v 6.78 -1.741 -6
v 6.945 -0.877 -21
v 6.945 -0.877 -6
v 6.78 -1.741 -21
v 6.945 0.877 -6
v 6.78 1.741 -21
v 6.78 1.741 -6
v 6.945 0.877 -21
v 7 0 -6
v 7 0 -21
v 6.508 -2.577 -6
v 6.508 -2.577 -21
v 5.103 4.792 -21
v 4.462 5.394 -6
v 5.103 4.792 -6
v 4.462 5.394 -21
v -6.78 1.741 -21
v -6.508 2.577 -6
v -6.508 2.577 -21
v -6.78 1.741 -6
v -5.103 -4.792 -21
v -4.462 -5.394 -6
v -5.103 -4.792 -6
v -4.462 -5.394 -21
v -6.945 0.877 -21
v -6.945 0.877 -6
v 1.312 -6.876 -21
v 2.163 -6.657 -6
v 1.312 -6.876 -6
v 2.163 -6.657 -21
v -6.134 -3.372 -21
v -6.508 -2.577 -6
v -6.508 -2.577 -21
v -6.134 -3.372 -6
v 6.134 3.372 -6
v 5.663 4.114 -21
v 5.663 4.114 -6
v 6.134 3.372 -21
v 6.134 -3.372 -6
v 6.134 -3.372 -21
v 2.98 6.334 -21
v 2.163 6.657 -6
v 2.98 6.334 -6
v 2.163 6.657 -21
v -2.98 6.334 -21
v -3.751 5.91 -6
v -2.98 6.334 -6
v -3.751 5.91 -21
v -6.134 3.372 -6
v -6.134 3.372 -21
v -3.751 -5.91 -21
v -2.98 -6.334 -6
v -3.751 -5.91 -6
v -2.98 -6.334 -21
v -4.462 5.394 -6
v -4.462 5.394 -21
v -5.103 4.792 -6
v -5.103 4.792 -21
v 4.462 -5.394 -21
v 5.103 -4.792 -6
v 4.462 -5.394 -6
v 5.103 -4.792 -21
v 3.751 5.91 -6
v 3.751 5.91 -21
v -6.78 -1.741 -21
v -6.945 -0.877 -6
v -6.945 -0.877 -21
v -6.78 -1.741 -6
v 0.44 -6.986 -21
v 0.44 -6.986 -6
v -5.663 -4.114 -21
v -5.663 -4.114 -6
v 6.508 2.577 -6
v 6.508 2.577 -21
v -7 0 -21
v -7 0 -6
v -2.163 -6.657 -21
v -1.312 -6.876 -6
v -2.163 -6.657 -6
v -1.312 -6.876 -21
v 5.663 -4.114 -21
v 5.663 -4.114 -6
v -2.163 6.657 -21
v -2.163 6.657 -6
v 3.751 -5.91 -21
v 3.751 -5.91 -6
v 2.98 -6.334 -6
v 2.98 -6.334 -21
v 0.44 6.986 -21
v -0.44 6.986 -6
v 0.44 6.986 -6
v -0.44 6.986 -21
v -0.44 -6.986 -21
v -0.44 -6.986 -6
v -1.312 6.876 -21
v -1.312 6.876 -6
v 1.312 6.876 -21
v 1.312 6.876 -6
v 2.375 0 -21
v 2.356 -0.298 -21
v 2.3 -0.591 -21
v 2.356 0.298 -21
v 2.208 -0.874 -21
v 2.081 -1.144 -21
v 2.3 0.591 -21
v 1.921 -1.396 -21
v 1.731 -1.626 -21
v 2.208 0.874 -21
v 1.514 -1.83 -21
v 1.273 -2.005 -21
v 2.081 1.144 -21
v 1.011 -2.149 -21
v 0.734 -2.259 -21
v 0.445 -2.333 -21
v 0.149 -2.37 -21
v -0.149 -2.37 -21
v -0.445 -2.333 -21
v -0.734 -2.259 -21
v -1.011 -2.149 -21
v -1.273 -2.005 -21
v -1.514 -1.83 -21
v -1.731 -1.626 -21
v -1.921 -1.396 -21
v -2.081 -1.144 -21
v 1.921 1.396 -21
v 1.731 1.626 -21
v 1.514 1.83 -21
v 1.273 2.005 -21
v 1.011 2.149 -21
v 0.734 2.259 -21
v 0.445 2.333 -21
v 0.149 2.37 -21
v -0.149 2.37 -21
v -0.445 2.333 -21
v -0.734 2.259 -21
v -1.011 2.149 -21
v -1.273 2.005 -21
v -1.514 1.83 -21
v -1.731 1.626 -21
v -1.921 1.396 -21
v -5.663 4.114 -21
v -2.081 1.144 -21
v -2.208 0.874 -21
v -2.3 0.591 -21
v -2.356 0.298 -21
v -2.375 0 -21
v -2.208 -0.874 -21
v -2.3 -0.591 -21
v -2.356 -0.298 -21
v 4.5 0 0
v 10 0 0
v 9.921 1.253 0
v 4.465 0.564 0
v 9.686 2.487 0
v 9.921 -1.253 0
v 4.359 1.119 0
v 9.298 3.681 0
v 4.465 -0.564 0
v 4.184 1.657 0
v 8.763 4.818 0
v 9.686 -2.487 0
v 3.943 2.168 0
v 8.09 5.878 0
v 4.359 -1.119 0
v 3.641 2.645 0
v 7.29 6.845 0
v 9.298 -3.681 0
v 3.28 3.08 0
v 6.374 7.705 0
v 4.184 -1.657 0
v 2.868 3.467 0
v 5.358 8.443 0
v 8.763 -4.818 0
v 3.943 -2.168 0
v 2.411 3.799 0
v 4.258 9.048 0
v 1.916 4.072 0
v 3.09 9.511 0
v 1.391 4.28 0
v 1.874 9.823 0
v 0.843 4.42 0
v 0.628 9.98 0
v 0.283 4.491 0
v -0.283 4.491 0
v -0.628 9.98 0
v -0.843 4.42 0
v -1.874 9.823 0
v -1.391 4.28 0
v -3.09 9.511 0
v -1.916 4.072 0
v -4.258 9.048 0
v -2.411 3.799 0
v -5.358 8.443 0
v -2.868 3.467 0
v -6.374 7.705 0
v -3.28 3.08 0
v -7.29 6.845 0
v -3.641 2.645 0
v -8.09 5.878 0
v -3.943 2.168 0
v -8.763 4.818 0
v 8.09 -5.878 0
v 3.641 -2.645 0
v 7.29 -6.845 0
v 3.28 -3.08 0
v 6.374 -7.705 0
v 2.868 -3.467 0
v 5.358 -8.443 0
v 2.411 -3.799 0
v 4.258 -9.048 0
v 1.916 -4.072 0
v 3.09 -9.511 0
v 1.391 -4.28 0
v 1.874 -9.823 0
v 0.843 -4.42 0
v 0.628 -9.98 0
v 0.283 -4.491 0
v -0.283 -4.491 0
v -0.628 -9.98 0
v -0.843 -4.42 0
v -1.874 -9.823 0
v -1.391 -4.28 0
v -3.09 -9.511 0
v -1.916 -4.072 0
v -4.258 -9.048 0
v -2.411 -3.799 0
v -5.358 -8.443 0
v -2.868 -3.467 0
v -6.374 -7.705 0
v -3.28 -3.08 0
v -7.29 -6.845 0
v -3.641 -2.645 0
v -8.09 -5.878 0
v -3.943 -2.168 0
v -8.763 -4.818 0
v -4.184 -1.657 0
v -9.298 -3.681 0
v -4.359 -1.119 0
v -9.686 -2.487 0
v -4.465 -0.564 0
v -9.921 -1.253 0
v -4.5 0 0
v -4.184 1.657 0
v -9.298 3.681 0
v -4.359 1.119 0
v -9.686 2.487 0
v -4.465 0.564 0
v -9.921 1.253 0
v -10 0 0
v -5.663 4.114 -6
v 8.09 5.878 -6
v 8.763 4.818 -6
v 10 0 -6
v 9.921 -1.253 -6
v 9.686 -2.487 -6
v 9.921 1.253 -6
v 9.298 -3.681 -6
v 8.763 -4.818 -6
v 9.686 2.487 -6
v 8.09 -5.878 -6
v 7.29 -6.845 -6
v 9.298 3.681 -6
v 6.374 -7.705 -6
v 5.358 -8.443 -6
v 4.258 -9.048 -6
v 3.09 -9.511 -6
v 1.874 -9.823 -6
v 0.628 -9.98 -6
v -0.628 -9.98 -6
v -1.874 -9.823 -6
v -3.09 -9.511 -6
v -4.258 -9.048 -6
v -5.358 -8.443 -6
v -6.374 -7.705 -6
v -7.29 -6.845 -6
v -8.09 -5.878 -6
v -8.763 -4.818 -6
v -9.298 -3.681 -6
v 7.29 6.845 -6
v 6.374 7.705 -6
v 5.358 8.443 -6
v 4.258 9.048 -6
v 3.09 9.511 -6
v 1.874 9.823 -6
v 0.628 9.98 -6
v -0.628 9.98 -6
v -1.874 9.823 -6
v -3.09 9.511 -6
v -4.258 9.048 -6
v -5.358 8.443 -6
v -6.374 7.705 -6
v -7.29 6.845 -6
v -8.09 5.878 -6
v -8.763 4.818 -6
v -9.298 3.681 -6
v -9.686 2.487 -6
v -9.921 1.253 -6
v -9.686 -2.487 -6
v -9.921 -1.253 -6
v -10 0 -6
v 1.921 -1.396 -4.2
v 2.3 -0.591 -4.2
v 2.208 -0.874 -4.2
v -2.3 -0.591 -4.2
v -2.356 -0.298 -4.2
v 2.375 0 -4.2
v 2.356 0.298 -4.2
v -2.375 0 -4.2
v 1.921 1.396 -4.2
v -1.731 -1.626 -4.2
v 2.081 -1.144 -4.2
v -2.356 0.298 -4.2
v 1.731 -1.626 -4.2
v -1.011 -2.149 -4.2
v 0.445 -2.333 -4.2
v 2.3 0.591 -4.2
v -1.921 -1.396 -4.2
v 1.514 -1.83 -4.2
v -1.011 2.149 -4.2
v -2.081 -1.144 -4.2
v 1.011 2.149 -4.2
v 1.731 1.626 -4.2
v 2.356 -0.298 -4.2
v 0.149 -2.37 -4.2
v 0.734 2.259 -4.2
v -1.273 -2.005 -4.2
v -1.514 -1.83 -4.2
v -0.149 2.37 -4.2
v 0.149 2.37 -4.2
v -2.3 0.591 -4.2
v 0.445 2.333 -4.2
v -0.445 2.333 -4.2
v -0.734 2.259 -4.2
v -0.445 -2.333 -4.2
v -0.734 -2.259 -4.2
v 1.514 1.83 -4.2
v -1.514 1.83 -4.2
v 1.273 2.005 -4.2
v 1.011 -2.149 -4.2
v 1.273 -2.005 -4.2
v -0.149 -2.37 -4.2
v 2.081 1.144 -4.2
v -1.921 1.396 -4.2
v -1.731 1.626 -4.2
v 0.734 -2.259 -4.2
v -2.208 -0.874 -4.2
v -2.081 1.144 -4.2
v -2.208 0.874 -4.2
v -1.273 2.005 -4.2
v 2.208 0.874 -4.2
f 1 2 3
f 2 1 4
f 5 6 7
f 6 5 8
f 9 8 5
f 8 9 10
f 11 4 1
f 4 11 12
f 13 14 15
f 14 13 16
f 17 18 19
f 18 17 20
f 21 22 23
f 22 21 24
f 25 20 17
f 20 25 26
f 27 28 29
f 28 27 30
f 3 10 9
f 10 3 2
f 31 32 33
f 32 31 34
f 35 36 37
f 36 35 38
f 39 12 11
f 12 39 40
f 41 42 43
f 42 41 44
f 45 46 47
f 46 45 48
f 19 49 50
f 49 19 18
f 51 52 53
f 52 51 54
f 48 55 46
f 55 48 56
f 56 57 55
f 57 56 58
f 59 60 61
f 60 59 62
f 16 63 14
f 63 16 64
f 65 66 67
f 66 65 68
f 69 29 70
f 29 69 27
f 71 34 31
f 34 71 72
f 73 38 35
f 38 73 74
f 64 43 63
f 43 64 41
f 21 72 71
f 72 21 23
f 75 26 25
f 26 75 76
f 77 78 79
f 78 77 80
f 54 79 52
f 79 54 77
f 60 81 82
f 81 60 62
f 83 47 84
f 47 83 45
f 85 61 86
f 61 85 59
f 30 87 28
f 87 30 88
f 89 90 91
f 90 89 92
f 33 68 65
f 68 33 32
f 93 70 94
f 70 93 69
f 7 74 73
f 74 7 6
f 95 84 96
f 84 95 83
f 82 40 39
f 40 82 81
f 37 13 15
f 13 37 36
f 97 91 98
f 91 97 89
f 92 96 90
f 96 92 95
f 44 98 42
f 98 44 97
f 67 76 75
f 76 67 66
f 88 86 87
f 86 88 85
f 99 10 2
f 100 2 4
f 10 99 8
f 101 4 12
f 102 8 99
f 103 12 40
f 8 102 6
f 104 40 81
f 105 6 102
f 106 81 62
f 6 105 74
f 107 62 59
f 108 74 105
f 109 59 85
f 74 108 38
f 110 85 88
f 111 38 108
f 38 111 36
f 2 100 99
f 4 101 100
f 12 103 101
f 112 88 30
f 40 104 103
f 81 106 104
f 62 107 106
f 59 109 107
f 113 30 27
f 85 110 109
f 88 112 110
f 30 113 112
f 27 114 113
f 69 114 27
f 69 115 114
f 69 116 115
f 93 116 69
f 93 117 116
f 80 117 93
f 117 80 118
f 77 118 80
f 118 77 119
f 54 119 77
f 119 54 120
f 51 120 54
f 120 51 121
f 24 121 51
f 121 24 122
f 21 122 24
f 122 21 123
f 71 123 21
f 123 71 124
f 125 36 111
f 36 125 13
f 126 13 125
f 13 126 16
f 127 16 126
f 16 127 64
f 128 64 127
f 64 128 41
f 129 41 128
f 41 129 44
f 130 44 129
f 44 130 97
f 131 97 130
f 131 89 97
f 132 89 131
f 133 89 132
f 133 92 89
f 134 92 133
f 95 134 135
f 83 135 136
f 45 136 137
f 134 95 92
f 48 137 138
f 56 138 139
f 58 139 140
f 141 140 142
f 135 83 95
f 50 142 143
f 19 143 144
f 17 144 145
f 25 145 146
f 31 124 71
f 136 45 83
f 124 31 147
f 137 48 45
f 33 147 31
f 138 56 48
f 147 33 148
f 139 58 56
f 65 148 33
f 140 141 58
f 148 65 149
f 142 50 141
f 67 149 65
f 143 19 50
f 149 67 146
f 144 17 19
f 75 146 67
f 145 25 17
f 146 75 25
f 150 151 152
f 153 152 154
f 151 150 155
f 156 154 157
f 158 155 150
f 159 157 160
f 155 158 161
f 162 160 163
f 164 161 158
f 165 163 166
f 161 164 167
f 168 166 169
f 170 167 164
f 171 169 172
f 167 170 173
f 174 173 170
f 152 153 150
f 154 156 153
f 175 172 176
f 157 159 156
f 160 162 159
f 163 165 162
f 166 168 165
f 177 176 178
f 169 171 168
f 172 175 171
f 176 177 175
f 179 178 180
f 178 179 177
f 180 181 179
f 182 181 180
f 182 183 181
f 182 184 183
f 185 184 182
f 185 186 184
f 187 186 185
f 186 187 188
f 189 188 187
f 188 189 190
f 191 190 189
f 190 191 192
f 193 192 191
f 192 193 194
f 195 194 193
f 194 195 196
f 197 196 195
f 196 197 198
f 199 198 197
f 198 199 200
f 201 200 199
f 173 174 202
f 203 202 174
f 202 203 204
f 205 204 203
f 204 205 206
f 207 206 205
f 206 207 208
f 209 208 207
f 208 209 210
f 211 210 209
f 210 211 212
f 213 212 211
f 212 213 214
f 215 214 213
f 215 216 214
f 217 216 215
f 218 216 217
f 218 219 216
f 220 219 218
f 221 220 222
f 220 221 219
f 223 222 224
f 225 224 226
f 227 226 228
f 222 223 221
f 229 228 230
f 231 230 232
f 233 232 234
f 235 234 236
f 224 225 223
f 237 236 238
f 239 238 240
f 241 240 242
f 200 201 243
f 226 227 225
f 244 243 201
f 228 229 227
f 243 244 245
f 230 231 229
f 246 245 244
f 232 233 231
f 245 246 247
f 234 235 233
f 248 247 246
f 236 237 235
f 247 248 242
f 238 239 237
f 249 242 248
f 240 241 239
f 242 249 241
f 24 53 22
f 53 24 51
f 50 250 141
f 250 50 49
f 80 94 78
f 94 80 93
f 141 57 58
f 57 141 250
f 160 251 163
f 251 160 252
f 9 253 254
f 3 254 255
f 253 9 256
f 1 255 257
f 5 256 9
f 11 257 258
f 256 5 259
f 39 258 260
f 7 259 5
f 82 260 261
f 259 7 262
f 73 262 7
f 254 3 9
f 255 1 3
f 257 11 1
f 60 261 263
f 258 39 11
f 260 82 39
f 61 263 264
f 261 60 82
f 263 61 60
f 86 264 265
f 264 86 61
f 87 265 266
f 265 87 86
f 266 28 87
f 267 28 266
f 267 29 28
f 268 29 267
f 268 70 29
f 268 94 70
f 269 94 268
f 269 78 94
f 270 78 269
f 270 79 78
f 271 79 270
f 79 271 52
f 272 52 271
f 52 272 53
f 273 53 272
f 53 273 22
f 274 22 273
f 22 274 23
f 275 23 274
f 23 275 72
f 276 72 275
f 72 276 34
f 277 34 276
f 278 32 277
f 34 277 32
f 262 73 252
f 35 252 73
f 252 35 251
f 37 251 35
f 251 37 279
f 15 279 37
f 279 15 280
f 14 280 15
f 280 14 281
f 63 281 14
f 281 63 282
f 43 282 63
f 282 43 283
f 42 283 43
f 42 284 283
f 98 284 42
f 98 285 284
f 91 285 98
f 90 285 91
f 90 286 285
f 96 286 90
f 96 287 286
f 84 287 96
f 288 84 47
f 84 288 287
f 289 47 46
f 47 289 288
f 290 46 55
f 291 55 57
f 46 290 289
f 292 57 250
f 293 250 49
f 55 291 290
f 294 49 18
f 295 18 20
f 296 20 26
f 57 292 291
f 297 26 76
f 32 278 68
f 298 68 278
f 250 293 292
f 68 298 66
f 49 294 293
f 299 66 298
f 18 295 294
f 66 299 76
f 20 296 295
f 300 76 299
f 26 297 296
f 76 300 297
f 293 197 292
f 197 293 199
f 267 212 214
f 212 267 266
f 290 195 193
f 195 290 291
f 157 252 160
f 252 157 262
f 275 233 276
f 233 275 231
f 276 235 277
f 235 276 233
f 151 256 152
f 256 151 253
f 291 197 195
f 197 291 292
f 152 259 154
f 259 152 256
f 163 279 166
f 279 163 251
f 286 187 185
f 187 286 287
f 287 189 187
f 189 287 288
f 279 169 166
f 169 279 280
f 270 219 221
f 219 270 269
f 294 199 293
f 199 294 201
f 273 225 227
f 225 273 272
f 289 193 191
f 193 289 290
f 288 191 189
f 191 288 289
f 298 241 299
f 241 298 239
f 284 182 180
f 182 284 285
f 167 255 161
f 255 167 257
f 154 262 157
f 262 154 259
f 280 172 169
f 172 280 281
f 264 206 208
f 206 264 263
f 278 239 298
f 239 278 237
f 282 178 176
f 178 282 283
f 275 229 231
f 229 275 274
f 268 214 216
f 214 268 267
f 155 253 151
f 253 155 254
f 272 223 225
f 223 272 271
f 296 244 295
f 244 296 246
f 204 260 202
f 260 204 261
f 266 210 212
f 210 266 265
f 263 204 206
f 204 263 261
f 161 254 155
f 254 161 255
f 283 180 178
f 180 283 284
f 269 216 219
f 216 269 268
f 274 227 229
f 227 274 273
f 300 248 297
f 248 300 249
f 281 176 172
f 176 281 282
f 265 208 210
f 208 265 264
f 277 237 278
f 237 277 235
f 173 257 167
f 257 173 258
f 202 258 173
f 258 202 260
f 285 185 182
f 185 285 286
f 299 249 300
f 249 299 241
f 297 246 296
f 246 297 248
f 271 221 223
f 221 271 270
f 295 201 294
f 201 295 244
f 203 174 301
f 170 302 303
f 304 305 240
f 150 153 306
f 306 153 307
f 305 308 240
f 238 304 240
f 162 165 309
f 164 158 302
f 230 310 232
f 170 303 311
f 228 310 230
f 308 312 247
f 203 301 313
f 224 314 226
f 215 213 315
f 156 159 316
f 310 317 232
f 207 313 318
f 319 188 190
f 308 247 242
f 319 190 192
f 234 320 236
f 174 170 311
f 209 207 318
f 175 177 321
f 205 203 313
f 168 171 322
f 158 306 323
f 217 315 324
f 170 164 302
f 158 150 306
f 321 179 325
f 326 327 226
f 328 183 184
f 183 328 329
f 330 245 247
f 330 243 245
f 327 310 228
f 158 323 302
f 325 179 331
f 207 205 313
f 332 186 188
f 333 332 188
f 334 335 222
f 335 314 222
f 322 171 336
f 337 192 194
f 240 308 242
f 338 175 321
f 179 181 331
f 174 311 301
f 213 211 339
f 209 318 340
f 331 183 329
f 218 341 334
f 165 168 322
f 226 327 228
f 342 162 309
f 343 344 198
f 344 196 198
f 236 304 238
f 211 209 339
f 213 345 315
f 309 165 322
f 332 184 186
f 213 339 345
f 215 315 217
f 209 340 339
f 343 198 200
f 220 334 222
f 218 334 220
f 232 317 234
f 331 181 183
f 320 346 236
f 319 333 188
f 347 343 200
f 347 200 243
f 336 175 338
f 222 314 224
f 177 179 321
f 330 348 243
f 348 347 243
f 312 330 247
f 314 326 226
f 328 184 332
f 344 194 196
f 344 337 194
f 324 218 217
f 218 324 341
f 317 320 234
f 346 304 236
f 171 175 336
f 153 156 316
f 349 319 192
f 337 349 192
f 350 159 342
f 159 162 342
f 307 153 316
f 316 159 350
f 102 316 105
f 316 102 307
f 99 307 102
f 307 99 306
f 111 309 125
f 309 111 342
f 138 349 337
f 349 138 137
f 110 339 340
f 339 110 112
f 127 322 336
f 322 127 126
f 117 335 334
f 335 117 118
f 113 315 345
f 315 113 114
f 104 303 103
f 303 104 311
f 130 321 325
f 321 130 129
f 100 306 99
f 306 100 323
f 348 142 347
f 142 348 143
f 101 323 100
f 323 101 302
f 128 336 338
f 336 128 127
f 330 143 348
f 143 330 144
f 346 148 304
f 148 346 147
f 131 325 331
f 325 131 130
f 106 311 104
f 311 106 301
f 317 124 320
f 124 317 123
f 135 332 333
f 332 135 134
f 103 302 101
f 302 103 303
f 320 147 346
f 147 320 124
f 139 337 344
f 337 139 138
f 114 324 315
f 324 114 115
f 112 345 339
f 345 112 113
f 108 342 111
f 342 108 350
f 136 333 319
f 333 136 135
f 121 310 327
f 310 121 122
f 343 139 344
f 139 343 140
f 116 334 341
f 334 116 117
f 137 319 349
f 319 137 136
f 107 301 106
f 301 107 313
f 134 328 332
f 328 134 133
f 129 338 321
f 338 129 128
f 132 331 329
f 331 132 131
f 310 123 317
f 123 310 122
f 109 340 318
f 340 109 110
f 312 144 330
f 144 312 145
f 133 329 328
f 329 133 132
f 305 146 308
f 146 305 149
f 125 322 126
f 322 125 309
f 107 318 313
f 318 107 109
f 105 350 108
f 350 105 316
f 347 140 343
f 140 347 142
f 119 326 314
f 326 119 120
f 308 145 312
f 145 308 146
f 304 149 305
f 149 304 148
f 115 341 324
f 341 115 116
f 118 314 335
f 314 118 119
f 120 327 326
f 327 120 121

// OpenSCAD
$fn = 50;


difference() {
	union() {
		translate(v = [0, 0, -21.0000000000]) {
			cylinder(h = 21, r = 7.0000000000);
		}
		translate(v = [0, 0, -6.0000000000]) {
			cylinder(h = 6, r = 10.0000000000);
		}
	}
	union() {
		translate(v = [0, 0, 0]) {
			rotate(a = [0, 0, 0]) {
				difference() {
					union() {
						#translate(v = [0, 0, -21.0000000000]) {
							cylinder(h = 21, r = 2.2500000000);
						}
						#translate(v = [0, 0, -4.2000000000]) {
							cylinder(h = 4.2000000000, r = 7.0000000000, r1 = 2.3750000000, r2 = 4.5000000000);
						}
						#translate(v = [0, 0, -21.0000000000]) {
							cylinder(h = 21, r = 2.3750000000);
						}
						#translate(v = [0, 0, -21.0000000000]) {
							cylinder(h = 21, r = 2.2500000000);
						}
					}
					union();
				}
			}
		}
	}
}
